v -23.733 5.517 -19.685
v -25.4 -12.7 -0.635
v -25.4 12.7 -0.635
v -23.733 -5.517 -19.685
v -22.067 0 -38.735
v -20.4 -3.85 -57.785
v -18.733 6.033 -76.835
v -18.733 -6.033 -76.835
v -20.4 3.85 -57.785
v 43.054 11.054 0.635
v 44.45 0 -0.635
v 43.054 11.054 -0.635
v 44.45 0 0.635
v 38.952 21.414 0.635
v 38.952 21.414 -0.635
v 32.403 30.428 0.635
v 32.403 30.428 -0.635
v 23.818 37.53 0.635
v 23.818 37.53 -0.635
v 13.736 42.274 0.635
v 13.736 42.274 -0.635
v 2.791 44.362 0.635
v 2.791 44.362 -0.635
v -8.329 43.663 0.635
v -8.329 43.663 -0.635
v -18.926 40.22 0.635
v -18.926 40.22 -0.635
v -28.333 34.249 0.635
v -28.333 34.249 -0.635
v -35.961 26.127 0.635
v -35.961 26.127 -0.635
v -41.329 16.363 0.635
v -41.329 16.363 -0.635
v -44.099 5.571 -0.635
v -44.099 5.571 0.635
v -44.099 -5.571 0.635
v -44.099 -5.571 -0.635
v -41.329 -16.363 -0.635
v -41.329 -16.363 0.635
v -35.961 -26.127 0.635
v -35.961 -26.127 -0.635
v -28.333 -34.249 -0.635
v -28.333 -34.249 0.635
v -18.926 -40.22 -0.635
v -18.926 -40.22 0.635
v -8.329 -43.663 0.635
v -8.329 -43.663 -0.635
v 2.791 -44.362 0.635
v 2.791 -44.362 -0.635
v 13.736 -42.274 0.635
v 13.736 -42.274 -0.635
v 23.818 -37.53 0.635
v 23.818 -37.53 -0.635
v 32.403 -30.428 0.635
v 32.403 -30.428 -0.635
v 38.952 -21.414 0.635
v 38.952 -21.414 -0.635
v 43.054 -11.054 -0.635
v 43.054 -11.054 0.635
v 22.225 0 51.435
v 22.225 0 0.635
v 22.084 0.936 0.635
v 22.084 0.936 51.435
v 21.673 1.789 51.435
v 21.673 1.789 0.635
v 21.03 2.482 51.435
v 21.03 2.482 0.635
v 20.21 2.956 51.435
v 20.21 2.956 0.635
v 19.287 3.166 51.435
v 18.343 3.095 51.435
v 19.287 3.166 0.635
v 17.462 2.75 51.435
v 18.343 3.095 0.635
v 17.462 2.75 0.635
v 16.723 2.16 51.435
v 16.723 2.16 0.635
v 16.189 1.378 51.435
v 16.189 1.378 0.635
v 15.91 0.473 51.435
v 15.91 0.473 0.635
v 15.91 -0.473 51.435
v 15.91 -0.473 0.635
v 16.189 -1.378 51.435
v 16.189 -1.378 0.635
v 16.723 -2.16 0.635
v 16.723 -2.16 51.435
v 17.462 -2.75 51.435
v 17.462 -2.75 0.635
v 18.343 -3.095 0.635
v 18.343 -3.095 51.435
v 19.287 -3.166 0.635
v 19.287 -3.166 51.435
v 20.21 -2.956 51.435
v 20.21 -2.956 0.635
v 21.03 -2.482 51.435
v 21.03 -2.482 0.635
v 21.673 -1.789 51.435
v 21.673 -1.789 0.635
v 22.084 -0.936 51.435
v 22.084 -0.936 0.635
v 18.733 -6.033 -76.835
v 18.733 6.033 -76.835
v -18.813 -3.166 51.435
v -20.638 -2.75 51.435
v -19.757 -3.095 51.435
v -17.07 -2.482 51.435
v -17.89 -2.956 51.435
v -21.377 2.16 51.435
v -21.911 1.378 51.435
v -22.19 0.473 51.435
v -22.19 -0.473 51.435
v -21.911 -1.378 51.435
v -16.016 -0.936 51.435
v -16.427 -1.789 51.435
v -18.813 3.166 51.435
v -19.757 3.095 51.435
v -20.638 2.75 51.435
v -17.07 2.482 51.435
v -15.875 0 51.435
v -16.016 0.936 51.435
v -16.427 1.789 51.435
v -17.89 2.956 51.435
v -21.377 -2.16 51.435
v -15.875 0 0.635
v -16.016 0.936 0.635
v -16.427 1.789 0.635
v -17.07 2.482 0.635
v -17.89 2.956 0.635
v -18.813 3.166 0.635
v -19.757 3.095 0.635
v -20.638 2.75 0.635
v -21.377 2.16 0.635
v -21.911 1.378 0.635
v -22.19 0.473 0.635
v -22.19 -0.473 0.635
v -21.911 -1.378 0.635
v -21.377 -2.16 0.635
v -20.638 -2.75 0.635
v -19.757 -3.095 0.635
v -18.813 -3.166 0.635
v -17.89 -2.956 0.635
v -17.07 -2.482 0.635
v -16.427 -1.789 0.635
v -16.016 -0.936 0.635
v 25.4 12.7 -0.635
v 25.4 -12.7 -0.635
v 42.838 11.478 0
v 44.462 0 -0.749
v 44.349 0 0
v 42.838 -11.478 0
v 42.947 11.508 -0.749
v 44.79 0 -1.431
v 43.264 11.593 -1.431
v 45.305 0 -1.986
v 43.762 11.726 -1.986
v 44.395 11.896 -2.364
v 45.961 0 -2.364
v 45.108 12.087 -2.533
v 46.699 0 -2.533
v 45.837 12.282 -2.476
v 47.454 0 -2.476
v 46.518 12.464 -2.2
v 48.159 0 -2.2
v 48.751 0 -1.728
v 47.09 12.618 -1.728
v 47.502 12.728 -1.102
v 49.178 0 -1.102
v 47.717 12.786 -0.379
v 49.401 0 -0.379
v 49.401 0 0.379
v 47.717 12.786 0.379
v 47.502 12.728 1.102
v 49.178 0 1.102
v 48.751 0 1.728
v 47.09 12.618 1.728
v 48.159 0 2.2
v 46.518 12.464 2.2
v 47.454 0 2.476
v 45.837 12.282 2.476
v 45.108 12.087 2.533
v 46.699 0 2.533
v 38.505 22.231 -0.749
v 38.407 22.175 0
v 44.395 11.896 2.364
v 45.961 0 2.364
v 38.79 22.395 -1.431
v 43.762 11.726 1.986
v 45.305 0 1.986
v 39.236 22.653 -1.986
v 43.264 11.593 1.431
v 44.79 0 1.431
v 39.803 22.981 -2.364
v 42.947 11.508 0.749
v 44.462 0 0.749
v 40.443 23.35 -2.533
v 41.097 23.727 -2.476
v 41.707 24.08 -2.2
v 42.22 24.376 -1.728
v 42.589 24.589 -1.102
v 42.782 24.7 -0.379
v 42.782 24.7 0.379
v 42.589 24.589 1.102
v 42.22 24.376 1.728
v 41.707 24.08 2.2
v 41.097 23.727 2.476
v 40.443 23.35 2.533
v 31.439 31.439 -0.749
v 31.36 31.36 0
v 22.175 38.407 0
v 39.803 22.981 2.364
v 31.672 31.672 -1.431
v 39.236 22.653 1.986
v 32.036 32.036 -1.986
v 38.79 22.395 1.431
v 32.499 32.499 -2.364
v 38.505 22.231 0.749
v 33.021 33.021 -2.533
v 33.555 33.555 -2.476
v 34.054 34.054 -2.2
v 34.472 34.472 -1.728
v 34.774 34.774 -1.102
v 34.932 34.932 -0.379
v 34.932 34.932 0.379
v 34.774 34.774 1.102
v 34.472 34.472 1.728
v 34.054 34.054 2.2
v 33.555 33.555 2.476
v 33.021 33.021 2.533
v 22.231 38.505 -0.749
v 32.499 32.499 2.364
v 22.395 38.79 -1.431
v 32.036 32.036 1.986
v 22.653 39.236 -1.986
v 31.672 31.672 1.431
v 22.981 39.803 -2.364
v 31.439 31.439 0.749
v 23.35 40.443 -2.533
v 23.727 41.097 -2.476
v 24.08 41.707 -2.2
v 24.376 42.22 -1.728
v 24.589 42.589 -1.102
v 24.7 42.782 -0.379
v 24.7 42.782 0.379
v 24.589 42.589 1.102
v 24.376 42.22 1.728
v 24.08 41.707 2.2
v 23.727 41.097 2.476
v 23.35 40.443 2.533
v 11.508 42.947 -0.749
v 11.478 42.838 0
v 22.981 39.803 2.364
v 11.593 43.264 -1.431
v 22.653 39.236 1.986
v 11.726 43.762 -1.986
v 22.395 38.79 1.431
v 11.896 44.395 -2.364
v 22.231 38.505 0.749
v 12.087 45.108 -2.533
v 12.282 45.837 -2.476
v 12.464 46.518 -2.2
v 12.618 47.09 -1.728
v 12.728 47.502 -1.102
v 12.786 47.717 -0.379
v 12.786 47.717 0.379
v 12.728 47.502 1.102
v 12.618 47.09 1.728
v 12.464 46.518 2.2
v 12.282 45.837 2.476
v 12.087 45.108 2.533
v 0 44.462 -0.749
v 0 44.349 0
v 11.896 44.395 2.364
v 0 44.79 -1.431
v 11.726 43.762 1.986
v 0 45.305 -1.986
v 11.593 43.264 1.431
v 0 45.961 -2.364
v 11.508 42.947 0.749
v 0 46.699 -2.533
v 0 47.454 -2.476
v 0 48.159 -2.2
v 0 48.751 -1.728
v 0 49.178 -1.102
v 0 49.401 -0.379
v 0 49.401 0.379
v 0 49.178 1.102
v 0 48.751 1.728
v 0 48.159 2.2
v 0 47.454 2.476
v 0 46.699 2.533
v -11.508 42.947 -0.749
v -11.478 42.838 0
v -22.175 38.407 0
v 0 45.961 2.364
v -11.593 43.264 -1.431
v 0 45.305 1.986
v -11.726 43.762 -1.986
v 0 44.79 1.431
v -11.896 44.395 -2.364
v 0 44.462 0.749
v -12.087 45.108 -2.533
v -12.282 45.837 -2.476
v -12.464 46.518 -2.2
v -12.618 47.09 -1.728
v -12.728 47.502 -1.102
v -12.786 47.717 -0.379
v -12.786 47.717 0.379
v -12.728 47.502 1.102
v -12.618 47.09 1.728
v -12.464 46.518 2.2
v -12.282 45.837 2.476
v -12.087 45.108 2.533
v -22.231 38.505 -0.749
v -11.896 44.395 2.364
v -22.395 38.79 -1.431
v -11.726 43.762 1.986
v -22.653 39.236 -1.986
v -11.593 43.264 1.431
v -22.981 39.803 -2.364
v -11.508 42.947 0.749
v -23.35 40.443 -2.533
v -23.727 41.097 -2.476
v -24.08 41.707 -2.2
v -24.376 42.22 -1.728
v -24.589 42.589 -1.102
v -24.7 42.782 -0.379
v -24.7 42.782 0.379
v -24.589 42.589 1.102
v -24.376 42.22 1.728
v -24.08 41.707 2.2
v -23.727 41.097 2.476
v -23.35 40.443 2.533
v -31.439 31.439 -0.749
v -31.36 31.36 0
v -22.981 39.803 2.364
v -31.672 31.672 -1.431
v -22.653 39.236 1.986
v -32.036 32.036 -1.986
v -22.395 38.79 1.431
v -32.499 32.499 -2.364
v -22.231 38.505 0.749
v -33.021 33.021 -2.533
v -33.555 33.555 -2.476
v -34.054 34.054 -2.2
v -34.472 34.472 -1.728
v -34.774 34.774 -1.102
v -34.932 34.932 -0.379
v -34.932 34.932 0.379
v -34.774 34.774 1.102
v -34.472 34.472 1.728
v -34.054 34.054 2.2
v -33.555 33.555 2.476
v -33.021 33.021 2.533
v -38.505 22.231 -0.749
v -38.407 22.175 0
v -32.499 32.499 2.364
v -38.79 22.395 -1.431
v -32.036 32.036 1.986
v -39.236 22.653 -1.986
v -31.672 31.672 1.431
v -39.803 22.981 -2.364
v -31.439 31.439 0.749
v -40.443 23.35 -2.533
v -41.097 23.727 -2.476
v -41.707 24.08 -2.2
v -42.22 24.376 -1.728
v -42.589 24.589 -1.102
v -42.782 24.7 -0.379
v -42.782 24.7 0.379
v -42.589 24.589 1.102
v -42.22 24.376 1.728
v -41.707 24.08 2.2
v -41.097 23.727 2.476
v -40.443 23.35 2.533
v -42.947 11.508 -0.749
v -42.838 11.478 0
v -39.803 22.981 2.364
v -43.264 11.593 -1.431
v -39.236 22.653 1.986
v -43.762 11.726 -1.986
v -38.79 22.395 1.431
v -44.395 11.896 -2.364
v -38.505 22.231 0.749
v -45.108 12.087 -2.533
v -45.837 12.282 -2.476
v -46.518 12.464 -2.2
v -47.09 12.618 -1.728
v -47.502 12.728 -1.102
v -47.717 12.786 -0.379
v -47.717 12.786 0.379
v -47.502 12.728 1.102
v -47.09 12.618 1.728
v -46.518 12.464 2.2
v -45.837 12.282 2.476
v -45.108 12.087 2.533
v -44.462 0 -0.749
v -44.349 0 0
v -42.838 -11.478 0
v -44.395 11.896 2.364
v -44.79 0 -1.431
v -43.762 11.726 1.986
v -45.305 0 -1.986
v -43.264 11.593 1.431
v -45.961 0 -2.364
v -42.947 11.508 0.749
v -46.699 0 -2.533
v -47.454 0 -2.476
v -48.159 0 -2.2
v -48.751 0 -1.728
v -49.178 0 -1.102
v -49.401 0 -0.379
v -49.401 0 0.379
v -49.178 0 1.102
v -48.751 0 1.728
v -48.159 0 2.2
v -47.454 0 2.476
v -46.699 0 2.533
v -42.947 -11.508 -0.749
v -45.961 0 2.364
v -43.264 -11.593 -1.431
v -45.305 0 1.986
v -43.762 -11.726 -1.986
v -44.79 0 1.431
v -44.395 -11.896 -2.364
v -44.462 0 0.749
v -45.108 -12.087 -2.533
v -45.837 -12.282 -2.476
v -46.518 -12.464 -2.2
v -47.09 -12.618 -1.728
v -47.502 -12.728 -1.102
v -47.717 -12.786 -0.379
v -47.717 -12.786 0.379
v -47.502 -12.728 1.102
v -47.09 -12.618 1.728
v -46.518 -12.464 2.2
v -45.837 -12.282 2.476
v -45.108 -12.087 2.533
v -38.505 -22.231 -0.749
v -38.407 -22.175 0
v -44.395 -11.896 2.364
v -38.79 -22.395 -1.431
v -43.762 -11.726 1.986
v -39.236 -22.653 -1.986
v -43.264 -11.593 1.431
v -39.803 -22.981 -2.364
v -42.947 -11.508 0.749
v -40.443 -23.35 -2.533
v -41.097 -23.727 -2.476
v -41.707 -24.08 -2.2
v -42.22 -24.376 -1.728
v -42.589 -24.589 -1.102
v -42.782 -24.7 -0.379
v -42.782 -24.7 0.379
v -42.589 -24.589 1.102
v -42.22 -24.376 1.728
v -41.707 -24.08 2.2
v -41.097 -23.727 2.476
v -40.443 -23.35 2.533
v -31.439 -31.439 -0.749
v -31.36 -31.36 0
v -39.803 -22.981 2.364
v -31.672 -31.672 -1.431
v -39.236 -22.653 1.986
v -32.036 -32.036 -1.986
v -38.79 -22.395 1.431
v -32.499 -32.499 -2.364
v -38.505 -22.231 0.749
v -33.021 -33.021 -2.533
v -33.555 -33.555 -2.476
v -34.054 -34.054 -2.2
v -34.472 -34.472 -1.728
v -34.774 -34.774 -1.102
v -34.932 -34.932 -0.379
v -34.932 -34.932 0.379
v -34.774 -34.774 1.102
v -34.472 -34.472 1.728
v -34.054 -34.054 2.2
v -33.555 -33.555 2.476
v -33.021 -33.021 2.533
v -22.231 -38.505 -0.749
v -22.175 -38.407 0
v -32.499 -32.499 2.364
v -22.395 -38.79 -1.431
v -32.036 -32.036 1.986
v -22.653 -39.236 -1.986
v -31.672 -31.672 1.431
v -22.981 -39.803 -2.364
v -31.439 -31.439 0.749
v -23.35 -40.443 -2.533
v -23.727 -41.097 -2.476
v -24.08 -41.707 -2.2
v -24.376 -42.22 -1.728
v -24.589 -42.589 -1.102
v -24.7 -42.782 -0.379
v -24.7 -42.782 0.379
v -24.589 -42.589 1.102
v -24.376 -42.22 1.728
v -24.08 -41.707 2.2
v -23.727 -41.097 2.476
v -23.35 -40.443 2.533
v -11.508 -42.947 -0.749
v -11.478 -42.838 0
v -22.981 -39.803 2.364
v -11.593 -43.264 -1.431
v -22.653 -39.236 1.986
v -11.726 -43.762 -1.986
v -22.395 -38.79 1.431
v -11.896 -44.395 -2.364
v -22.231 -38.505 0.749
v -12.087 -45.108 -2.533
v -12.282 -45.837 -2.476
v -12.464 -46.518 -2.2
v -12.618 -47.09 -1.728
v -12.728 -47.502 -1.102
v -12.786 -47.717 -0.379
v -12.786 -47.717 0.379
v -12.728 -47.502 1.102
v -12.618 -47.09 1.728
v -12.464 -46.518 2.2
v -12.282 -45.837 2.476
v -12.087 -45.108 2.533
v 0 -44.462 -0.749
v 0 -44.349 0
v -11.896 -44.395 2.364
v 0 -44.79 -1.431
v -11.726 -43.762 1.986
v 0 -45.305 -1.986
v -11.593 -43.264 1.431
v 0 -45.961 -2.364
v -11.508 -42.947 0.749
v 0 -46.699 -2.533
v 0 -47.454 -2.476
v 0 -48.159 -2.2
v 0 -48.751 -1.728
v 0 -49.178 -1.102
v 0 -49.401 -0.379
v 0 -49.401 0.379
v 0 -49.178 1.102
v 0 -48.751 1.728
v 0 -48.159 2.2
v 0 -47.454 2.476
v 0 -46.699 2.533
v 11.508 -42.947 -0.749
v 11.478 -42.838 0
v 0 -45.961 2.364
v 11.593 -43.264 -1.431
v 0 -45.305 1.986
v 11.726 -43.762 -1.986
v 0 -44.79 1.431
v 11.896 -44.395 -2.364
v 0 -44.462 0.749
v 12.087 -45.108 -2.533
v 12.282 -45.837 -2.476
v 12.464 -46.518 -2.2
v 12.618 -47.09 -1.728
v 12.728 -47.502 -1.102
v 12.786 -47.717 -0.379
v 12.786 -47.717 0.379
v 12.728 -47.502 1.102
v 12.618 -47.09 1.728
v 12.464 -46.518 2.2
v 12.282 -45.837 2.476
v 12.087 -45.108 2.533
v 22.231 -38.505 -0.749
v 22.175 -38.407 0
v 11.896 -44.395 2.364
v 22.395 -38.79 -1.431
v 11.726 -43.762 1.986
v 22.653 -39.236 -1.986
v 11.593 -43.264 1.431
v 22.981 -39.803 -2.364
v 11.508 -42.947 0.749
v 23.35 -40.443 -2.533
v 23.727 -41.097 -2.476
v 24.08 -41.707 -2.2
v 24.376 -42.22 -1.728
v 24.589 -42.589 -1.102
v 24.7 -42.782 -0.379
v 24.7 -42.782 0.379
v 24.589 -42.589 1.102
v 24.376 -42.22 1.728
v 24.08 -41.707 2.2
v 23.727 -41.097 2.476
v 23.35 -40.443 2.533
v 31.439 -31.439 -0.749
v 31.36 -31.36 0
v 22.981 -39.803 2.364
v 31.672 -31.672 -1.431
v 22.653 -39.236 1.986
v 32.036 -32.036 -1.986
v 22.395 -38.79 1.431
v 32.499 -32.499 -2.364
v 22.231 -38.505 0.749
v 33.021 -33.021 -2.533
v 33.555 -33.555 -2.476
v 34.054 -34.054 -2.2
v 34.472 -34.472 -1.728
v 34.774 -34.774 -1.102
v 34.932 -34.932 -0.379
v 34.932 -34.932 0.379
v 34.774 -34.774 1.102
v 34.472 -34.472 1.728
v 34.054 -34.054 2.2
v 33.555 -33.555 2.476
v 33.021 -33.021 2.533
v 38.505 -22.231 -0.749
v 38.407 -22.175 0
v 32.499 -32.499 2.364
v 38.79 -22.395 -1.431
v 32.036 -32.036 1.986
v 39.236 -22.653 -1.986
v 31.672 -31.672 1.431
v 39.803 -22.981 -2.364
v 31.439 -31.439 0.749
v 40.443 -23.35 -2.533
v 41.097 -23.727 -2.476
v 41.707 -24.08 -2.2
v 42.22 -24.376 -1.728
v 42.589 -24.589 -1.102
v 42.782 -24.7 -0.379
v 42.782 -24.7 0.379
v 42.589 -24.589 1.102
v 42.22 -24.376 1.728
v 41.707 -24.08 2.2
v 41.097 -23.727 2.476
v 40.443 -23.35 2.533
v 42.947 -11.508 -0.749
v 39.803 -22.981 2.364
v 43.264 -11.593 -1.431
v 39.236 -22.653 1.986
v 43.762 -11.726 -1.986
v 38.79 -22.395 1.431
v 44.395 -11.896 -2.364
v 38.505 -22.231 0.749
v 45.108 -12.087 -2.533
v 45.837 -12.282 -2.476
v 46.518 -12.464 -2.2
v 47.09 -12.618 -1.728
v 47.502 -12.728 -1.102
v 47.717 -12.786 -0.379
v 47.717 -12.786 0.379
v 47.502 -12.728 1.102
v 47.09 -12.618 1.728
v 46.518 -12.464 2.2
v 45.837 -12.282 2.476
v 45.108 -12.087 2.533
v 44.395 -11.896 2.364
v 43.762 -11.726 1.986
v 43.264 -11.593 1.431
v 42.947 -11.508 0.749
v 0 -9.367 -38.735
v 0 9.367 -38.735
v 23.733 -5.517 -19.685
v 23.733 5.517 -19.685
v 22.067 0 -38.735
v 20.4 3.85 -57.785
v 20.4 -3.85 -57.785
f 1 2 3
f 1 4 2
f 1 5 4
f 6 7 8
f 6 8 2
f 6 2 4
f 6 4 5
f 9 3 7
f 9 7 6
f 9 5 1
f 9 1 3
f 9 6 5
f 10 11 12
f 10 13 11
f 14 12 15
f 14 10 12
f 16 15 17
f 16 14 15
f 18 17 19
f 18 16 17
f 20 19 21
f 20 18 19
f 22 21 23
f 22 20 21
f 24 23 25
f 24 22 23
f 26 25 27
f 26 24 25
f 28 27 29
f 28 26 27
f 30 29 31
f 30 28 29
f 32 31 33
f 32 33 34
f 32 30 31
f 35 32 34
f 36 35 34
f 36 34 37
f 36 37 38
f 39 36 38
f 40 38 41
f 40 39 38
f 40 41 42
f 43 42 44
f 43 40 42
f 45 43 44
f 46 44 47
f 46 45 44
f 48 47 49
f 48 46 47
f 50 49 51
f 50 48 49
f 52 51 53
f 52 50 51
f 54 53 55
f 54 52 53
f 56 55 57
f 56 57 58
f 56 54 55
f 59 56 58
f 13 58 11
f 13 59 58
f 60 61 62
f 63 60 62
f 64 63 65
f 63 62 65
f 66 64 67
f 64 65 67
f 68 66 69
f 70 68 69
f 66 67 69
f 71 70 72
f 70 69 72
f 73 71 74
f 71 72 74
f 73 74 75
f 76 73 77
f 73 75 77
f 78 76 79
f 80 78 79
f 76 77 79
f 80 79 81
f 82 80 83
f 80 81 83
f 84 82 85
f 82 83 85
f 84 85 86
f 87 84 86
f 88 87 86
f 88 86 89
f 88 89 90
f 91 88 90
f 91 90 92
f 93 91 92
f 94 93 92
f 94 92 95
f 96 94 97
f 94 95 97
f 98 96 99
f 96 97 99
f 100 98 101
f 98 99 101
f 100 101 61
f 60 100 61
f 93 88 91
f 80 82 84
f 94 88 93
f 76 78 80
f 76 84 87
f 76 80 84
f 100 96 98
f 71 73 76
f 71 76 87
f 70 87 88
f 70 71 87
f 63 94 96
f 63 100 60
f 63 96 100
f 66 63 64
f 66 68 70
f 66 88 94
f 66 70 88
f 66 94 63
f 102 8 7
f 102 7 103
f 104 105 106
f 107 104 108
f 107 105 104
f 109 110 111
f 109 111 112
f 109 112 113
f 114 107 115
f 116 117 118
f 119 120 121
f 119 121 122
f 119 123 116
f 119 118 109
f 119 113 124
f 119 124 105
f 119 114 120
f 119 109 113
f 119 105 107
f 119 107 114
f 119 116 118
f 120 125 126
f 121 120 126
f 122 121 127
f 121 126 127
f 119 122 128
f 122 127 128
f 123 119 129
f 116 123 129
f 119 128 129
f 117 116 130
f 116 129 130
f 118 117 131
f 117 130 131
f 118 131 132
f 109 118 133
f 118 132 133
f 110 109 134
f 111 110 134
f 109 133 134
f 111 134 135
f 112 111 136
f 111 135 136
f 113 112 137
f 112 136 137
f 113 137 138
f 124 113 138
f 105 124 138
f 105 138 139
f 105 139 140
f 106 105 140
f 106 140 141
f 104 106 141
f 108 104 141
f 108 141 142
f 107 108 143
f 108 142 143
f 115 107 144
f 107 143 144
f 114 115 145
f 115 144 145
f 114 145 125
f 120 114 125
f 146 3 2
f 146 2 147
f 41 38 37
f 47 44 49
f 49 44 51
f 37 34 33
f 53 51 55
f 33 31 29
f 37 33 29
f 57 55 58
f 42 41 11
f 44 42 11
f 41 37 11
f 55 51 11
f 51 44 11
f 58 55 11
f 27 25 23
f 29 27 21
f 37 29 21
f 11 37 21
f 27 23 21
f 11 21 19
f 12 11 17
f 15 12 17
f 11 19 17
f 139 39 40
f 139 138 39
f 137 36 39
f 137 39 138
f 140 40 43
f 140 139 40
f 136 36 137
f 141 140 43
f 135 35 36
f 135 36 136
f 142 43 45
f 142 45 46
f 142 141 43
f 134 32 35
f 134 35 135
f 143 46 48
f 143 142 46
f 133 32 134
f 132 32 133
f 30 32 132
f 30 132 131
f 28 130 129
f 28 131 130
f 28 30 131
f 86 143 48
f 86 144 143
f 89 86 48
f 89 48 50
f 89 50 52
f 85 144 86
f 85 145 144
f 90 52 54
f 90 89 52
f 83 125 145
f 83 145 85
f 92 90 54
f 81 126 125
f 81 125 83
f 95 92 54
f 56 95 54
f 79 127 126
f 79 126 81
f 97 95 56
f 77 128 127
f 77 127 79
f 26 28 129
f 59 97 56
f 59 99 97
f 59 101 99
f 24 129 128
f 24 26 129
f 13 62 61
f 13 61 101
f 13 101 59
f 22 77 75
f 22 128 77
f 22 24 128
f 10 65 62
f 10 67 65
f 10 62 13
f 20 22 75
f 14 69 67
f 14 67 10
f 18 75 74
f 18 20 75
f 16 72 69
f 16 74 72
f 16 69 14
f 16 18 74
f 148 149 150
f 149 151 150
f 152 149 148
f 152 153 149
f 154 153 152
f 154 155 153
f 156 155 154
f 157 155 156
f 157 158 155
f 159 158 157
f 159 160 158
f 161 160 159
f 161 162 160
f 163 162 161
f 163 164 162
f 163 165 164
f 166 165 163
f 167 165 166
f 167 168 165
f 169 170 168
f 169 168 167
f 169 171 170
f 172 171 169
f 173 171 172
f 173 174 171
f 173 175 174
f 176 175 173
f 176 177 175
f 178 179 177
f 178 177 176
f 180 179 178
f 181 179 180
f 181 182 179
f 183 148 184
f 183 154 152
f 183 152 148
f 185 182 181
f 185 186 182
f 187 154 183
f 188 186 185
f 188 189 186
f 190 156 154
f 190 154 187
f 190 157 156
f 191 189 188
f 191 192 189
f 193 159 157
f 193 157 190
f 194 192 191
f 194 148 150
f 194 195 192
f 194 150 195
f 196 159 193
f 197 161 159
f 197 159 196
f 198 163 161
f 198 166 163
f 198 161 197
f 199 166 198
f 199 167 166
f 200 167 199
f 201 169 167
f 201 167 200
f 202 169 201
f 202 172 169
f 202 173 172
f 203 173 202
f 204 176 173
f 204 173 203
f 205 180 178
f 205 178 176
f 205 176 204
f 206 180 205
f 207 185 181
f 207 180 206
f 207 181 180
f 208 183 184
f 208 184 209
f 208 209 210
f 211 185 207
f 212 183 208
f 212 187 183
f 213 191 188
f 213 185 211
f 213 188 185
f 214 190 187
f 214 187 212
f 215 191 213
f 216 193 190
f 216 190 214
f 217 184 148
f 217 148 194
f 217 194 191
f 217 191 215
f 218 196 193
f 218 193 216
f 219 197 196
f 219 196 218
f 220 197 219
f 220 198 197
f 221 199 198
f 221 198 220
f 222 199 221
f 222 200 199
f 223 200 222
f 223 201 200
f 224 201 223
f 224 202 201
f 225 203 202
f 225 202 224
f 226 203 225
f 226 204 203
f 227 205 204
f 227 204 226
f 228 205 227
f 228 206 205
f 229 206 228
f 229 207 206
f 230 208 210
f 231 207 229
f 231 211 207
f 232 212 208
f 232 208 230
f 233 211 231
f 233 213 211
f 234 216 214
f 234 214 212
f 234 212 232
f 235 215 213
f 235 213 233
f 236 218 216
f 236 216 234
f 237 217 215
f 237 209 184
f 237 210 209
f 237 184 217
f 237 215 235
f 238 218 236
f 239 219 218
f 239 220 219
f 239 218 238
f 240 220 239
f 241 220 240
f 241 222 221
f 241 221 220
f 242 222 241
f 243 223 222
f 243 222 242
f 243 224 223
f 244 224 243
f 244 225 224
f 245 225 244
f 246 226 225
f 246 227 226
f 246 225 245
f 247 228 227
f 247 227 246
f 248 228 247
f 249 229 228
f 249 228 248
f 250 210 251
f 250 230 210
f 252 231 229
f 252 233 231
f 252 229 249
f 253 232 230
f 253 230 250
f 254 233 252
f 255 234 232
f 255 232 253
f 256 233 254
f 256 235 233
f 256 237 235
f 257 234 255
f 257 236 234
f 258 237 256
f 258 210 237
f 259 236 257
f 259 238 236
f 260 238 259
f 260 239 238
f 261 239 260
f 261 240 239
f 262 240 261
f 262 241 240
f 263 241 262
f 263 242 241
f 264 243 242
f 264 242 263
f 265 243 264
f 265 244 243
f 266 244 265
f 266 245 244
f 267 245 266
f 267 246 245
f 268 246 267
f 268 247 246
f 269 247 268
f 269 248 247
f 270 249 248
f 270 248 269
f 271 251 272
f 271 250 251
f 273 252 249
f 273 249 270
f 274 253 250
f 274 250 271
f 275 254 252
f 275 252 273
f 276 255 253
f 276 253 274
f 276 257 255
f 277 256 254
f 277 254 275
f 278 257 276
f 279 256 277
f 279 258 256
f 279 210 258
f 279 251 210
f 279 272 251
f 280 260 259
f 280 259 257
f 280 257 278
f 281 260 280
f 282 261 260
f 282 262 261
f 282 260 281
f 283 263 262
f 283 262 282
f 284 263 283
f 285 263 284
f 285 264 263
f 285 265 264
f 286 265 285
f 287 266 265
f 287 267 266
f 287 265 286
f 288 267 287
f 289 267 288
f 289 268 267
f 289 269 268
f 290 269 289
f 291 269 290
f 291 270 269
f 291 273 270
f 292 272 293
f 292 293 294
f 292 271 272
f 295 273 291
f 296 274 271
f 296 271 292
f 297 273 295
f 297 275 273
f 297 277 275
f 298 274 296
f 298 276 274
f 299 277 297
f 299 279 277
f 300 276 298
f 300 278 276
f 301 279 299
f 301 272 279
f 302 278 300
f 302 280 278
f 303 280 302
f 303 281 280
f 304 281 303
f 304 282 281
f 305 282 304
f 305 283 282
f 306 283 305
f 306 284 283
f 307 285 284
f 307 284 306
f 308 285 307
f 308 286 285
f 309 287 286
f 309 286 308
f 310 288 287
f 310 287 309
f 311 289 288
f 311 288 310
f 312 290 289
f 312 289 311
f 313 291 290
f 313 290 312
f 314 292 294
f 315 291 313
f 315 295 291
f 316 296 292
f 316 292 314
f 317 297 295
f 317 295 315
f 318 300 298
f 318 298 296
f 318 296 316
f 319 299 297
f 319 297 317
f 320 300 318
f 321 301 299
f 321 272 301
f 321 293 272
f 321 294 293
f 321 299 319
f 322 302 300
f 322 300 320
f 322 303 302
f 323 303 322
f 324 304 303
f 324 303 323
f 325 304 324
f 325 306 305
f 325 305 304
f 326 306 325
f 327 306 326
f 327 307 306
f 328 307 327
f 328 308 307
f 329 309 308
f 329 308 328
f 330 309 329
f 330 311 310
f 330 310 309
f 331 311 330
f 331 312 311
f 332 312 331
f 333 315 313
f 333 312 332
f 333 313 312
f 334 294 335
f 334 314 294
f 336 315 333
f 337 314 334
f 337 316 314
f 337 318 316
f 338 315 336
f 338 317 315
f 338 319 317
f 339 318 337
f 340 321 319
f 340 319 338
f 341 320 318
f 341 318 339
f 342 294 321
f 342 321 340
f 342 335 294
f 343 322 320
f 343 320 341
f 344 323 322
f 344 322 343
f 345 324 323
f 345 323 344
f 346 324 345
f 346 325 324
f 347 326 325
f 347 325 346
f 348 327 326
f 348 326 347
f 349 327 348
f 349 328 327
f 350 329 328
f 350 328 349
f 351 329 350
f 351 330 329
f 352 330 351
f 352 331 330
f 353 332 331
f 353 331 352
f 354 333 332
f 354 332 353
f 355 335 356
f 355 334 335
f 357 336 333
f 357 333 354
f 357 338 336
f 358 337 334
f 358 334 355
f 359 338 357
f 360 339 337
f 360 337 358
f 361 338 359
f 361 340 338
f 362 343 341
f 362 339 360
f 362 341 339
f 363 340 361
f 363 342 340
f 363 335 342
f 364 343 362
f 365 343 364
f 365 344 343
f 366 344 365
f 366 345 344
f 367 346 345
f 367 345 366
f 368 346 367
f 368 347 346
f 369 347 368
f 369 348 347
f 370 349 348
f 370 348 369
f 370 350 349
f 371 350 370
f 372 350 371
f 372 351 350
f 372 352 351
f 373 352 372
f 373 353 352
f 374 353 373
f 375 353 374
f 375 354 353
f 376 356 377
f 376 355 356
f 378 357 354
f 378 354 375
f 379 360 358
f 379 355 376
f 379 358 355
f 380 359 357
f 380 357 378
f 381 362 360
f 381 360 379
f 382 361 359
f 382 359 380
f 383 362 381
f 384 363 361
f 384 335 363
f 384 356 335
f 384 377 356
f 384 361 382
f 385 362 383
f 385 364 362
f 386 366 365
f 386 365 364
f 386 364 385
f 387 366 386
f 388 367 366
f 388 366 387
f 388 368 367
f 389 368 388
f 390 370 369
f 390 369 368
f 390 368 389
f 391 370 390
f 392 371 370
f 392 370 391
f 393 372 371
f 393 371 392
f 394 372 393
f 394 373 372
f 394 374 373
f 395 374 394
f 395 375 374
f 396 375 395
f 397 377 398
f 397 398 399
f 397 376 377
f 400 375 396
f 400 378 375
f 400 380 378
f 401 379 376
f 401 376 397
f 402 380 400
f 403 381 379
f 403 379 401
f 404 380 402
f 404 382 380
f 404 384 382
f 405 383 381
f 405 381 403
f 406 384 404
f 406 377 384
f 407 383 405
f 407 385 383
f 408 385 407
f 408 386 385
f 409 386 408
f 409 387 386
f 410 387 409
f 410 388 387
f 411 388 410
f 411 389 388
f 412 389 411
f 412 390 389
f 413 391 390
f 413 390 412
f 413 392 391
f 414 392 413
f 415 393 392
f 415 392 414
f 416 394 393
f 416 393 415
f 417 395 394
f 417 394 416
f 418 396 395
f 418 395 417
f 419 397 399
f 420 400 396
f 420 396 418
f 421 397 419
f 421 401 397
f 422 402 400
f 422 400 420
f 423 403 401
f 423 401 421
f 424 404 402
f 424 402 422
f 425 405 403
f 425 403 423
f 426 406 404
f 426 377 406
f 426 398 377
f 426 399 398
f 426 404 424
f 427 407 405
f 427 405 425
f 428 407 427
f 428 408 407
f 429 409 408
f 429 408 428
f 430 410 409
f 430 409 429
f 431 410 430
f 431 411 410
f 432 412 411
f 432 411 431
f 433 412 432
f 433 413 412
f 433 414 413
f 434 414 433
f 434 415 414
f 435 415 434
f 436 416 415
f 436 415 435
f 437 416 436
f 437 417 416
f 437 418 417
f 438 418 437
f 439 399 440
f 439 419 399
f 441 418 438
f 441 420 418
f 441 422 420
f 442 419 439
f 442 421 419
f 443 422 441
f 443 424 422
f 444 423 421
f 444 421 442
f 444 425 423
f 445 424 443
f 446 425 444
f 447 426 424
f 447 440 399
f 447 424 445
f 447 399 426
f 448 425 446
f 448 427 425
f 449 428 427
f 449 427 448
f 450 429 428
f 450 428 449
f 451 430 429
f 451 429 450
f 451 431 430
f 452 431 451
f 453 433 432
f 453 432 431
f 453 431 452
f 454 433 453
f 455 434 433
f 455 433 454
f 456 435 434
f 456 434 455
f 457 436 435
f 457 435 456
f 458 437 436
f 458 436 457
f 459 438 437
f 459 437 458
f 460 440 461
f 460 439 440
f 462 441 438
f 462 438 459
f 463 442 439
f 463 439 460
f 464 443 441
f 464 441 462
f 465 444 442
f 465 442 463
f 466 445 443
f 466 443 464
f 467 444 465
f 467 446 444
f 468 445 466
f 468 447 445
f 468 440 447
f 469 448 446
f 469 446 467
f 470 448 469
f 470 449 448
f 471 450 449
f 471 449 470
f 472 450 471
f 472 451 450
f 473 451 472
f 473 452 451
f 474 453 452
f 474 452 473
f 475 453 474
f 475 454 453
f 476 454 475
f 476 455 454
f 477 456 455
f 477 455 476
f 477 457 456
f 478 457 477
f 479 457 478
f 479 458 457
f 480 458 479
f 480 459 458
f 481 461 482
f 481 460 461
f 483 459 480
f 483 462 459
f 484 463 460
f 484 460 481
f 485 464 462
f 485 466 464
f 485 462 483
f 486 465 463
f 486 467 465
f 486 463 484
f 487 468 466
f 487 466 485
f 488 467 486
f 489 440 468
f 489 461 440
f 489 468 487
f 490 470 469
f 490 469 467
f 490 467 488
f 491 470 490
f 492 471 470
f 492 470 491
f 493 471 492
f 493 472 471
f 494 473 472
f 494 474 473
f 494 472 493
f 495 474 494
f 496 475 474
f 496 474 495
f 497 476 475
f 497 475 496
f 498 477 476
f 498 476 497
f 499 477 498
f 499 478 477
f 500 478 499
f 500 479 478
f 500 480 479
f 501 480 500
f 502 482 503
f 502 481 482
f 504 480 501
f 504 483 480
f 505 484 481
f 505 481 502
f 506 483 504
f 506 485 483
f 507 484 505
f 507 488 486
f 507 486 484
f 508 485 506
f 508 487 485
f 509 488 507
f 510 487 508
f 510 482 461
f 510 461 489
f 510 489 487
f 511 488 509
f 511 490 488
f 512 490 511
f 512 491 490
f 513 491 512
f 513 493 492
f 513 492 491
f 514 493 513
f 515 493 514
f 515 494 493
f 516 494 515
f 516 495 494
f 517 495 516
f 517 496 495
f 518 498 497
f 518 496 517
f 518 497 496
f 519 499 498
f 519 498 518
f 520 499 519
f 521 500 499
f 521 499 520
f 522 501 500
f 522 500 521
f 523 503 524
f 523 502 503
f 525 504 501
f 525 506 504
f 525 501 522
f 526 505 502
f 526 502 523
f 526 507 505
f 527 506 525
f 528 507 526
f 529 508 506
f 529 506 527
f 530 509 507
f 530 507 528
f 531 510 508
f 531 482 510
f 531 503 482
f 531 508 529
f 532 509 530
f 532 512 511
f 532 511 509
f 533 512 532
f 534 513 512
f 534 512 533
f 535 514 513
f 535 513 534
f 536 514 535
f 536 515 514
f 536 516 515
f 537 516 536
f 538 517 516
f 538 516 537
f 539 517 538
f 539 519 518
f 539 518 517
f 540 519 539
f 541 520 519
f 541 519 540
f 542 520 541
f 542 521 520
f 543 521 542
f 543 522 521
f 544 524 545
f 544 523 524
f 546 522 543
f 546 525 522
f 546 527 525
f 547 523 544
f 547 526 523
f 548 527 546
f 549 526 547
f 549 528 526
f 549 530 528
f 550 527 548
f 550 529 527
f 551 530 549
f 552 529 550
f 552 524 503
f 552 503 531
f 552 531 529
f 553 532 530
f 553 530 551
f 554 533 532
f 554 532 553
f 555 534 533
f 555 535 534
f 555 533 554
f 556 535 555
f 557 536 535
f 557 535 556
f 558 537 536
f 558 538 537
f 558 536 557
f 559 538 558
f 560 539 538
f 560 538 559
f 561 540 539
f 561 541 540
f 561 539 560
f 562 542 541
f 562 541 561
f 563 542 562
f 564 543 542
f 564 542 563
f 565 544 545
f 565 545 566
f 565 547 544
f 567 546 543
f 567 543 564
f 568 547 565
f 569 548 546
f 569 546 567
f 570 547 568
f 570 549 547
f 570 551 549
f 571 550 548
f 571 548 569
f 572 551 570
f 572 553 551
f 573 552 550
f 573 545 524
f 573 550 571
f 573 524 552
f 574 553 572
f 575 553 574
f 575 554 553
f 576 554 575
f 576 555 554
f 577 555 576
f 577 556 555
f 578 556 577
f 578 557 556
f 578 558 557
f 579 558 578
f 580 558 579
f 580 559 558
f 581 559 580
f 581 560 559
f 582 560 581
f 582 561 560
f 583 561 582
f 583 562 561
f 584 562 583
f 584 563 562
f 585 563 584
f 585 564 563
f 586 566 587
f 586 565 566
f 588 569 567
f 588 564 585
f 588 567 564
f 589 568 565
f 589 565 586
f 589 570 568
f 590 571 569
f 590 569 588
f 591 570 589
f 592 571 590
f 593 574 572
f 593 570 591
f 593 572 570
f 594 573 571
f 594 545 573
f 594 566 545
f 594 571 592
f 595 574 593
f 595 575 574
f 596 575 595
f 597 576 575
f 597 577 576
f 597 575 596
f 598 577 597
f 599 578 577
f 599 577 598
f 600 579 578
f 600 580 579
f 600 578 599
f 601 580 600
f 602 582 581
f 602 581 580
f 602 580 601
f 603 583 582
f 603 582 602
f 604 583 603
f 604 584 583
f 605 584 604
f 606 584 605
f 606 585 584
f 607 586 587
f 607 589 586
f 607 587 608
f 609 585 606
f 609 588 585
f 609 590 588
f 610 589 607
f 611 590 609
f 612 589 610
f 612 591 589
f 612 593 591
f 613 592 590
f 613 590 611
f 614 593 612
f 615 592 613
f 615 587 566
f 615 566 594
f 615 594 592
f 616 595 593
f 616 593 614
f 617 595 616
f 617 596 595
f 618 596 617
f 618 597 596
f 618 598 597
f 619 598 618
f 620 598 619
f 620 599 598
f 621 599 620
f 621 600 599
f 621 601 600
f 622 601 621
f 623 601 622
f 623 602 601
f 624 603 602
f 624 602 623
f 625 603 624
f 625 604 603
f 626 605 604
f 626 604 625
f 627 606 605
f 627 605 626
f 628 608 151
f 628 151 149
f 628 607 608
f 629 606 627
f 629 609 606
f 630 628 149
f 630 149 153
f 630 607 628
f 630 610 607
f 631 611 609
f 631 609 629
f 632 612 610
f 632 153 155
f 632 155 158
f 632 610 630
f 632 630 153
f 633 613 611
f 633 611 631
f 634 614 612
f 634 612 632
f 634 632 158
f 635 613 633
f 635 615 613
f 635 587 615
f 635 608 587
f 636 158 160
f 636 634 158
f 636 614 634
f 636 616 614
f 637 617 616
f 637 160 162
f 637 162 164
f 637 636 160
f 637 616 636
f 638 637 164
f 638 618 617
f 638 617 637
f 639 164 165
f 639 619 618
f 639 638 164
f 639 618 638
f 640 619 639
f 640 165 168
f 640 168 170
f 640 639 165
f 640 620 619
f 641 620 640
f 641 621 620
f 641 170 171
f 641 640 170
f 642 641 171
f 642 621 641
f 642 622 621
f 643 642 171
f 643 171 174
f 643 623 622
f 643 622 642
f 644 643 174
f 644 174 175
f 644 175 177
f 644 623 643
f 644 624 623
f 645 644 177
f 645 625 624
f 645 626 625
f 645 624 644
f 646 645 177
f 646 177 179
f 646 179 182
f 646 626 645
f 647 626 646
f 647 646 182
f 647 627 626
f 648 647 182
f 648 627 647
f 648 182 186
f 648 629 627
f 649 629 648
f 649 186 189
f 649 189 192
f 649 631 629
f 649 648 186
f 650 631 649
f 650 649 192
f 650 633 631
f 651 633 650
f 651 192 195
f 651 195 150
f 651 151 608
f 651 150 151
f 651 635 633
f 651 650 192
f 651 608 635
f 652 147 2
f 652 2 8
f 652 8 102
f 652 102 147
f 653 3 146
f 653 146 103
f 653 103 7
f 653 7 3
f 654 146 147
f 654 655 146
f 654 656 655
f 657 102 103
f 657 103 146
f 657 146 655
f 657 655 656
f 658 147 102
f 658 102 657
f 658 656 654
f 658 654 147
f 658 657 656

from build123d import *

# Parameters (mm, degrees)
F0_R     = 44.45
F1_DEPTH = 0.635
F3_R     = 2.54
F5_W     = 50.8
F5_H     = 25.4
F6_DEPTH = 76.2
F6_TAPER = 5
F7_R     = 3.175
F9_DEPTH = 50.8


with BuildPart() as f1:
    # F0 (on Top) → F1 (new body, symmetric)
    with BuildSketch(Plane.XY):
        Circle(F0_R)
    extrude(amount=F1_DEPTH, both=True)

    # F7 (on face) → F9 (join, through all)
    with BuildSketch(Plane.XY.offset(0.635)):
        with Locations((-19.05, 0)):
            Circle(F7_R)
        with Locations((19.05, 0)):
            Circle(F7_R)
    extrude(amount=F9_DEPTH)


with BuildPart() as f4:
    # F4: sweep along a path in F2
    with BuildLine(Plane.XY) as f4_path:
        CenterArc((0, 0), 48.26, 0, 360)
    # F3 (on Front) → F4 (sweep)
    with BuildSketch(Plane.XZ):
        with Locations((-46.8890815973, 0)):
            Circle(F3_R)
    sweep(path=f4_path.line)


with BuildPart() as f6:
    # F5 (on face) → F6 (new body)
    with BuildSketch(Plane(origin=(0, 0, -0.635), x_dir=(1, 0, 0), z_dir=(0, 0, -1))):
        Rectangle(F5_W, F5_H)
    extrude(amount=F6_DEPTH, taper=F6_TAPER)


solid = Compound([f1.part, f4.part, f6.part])
